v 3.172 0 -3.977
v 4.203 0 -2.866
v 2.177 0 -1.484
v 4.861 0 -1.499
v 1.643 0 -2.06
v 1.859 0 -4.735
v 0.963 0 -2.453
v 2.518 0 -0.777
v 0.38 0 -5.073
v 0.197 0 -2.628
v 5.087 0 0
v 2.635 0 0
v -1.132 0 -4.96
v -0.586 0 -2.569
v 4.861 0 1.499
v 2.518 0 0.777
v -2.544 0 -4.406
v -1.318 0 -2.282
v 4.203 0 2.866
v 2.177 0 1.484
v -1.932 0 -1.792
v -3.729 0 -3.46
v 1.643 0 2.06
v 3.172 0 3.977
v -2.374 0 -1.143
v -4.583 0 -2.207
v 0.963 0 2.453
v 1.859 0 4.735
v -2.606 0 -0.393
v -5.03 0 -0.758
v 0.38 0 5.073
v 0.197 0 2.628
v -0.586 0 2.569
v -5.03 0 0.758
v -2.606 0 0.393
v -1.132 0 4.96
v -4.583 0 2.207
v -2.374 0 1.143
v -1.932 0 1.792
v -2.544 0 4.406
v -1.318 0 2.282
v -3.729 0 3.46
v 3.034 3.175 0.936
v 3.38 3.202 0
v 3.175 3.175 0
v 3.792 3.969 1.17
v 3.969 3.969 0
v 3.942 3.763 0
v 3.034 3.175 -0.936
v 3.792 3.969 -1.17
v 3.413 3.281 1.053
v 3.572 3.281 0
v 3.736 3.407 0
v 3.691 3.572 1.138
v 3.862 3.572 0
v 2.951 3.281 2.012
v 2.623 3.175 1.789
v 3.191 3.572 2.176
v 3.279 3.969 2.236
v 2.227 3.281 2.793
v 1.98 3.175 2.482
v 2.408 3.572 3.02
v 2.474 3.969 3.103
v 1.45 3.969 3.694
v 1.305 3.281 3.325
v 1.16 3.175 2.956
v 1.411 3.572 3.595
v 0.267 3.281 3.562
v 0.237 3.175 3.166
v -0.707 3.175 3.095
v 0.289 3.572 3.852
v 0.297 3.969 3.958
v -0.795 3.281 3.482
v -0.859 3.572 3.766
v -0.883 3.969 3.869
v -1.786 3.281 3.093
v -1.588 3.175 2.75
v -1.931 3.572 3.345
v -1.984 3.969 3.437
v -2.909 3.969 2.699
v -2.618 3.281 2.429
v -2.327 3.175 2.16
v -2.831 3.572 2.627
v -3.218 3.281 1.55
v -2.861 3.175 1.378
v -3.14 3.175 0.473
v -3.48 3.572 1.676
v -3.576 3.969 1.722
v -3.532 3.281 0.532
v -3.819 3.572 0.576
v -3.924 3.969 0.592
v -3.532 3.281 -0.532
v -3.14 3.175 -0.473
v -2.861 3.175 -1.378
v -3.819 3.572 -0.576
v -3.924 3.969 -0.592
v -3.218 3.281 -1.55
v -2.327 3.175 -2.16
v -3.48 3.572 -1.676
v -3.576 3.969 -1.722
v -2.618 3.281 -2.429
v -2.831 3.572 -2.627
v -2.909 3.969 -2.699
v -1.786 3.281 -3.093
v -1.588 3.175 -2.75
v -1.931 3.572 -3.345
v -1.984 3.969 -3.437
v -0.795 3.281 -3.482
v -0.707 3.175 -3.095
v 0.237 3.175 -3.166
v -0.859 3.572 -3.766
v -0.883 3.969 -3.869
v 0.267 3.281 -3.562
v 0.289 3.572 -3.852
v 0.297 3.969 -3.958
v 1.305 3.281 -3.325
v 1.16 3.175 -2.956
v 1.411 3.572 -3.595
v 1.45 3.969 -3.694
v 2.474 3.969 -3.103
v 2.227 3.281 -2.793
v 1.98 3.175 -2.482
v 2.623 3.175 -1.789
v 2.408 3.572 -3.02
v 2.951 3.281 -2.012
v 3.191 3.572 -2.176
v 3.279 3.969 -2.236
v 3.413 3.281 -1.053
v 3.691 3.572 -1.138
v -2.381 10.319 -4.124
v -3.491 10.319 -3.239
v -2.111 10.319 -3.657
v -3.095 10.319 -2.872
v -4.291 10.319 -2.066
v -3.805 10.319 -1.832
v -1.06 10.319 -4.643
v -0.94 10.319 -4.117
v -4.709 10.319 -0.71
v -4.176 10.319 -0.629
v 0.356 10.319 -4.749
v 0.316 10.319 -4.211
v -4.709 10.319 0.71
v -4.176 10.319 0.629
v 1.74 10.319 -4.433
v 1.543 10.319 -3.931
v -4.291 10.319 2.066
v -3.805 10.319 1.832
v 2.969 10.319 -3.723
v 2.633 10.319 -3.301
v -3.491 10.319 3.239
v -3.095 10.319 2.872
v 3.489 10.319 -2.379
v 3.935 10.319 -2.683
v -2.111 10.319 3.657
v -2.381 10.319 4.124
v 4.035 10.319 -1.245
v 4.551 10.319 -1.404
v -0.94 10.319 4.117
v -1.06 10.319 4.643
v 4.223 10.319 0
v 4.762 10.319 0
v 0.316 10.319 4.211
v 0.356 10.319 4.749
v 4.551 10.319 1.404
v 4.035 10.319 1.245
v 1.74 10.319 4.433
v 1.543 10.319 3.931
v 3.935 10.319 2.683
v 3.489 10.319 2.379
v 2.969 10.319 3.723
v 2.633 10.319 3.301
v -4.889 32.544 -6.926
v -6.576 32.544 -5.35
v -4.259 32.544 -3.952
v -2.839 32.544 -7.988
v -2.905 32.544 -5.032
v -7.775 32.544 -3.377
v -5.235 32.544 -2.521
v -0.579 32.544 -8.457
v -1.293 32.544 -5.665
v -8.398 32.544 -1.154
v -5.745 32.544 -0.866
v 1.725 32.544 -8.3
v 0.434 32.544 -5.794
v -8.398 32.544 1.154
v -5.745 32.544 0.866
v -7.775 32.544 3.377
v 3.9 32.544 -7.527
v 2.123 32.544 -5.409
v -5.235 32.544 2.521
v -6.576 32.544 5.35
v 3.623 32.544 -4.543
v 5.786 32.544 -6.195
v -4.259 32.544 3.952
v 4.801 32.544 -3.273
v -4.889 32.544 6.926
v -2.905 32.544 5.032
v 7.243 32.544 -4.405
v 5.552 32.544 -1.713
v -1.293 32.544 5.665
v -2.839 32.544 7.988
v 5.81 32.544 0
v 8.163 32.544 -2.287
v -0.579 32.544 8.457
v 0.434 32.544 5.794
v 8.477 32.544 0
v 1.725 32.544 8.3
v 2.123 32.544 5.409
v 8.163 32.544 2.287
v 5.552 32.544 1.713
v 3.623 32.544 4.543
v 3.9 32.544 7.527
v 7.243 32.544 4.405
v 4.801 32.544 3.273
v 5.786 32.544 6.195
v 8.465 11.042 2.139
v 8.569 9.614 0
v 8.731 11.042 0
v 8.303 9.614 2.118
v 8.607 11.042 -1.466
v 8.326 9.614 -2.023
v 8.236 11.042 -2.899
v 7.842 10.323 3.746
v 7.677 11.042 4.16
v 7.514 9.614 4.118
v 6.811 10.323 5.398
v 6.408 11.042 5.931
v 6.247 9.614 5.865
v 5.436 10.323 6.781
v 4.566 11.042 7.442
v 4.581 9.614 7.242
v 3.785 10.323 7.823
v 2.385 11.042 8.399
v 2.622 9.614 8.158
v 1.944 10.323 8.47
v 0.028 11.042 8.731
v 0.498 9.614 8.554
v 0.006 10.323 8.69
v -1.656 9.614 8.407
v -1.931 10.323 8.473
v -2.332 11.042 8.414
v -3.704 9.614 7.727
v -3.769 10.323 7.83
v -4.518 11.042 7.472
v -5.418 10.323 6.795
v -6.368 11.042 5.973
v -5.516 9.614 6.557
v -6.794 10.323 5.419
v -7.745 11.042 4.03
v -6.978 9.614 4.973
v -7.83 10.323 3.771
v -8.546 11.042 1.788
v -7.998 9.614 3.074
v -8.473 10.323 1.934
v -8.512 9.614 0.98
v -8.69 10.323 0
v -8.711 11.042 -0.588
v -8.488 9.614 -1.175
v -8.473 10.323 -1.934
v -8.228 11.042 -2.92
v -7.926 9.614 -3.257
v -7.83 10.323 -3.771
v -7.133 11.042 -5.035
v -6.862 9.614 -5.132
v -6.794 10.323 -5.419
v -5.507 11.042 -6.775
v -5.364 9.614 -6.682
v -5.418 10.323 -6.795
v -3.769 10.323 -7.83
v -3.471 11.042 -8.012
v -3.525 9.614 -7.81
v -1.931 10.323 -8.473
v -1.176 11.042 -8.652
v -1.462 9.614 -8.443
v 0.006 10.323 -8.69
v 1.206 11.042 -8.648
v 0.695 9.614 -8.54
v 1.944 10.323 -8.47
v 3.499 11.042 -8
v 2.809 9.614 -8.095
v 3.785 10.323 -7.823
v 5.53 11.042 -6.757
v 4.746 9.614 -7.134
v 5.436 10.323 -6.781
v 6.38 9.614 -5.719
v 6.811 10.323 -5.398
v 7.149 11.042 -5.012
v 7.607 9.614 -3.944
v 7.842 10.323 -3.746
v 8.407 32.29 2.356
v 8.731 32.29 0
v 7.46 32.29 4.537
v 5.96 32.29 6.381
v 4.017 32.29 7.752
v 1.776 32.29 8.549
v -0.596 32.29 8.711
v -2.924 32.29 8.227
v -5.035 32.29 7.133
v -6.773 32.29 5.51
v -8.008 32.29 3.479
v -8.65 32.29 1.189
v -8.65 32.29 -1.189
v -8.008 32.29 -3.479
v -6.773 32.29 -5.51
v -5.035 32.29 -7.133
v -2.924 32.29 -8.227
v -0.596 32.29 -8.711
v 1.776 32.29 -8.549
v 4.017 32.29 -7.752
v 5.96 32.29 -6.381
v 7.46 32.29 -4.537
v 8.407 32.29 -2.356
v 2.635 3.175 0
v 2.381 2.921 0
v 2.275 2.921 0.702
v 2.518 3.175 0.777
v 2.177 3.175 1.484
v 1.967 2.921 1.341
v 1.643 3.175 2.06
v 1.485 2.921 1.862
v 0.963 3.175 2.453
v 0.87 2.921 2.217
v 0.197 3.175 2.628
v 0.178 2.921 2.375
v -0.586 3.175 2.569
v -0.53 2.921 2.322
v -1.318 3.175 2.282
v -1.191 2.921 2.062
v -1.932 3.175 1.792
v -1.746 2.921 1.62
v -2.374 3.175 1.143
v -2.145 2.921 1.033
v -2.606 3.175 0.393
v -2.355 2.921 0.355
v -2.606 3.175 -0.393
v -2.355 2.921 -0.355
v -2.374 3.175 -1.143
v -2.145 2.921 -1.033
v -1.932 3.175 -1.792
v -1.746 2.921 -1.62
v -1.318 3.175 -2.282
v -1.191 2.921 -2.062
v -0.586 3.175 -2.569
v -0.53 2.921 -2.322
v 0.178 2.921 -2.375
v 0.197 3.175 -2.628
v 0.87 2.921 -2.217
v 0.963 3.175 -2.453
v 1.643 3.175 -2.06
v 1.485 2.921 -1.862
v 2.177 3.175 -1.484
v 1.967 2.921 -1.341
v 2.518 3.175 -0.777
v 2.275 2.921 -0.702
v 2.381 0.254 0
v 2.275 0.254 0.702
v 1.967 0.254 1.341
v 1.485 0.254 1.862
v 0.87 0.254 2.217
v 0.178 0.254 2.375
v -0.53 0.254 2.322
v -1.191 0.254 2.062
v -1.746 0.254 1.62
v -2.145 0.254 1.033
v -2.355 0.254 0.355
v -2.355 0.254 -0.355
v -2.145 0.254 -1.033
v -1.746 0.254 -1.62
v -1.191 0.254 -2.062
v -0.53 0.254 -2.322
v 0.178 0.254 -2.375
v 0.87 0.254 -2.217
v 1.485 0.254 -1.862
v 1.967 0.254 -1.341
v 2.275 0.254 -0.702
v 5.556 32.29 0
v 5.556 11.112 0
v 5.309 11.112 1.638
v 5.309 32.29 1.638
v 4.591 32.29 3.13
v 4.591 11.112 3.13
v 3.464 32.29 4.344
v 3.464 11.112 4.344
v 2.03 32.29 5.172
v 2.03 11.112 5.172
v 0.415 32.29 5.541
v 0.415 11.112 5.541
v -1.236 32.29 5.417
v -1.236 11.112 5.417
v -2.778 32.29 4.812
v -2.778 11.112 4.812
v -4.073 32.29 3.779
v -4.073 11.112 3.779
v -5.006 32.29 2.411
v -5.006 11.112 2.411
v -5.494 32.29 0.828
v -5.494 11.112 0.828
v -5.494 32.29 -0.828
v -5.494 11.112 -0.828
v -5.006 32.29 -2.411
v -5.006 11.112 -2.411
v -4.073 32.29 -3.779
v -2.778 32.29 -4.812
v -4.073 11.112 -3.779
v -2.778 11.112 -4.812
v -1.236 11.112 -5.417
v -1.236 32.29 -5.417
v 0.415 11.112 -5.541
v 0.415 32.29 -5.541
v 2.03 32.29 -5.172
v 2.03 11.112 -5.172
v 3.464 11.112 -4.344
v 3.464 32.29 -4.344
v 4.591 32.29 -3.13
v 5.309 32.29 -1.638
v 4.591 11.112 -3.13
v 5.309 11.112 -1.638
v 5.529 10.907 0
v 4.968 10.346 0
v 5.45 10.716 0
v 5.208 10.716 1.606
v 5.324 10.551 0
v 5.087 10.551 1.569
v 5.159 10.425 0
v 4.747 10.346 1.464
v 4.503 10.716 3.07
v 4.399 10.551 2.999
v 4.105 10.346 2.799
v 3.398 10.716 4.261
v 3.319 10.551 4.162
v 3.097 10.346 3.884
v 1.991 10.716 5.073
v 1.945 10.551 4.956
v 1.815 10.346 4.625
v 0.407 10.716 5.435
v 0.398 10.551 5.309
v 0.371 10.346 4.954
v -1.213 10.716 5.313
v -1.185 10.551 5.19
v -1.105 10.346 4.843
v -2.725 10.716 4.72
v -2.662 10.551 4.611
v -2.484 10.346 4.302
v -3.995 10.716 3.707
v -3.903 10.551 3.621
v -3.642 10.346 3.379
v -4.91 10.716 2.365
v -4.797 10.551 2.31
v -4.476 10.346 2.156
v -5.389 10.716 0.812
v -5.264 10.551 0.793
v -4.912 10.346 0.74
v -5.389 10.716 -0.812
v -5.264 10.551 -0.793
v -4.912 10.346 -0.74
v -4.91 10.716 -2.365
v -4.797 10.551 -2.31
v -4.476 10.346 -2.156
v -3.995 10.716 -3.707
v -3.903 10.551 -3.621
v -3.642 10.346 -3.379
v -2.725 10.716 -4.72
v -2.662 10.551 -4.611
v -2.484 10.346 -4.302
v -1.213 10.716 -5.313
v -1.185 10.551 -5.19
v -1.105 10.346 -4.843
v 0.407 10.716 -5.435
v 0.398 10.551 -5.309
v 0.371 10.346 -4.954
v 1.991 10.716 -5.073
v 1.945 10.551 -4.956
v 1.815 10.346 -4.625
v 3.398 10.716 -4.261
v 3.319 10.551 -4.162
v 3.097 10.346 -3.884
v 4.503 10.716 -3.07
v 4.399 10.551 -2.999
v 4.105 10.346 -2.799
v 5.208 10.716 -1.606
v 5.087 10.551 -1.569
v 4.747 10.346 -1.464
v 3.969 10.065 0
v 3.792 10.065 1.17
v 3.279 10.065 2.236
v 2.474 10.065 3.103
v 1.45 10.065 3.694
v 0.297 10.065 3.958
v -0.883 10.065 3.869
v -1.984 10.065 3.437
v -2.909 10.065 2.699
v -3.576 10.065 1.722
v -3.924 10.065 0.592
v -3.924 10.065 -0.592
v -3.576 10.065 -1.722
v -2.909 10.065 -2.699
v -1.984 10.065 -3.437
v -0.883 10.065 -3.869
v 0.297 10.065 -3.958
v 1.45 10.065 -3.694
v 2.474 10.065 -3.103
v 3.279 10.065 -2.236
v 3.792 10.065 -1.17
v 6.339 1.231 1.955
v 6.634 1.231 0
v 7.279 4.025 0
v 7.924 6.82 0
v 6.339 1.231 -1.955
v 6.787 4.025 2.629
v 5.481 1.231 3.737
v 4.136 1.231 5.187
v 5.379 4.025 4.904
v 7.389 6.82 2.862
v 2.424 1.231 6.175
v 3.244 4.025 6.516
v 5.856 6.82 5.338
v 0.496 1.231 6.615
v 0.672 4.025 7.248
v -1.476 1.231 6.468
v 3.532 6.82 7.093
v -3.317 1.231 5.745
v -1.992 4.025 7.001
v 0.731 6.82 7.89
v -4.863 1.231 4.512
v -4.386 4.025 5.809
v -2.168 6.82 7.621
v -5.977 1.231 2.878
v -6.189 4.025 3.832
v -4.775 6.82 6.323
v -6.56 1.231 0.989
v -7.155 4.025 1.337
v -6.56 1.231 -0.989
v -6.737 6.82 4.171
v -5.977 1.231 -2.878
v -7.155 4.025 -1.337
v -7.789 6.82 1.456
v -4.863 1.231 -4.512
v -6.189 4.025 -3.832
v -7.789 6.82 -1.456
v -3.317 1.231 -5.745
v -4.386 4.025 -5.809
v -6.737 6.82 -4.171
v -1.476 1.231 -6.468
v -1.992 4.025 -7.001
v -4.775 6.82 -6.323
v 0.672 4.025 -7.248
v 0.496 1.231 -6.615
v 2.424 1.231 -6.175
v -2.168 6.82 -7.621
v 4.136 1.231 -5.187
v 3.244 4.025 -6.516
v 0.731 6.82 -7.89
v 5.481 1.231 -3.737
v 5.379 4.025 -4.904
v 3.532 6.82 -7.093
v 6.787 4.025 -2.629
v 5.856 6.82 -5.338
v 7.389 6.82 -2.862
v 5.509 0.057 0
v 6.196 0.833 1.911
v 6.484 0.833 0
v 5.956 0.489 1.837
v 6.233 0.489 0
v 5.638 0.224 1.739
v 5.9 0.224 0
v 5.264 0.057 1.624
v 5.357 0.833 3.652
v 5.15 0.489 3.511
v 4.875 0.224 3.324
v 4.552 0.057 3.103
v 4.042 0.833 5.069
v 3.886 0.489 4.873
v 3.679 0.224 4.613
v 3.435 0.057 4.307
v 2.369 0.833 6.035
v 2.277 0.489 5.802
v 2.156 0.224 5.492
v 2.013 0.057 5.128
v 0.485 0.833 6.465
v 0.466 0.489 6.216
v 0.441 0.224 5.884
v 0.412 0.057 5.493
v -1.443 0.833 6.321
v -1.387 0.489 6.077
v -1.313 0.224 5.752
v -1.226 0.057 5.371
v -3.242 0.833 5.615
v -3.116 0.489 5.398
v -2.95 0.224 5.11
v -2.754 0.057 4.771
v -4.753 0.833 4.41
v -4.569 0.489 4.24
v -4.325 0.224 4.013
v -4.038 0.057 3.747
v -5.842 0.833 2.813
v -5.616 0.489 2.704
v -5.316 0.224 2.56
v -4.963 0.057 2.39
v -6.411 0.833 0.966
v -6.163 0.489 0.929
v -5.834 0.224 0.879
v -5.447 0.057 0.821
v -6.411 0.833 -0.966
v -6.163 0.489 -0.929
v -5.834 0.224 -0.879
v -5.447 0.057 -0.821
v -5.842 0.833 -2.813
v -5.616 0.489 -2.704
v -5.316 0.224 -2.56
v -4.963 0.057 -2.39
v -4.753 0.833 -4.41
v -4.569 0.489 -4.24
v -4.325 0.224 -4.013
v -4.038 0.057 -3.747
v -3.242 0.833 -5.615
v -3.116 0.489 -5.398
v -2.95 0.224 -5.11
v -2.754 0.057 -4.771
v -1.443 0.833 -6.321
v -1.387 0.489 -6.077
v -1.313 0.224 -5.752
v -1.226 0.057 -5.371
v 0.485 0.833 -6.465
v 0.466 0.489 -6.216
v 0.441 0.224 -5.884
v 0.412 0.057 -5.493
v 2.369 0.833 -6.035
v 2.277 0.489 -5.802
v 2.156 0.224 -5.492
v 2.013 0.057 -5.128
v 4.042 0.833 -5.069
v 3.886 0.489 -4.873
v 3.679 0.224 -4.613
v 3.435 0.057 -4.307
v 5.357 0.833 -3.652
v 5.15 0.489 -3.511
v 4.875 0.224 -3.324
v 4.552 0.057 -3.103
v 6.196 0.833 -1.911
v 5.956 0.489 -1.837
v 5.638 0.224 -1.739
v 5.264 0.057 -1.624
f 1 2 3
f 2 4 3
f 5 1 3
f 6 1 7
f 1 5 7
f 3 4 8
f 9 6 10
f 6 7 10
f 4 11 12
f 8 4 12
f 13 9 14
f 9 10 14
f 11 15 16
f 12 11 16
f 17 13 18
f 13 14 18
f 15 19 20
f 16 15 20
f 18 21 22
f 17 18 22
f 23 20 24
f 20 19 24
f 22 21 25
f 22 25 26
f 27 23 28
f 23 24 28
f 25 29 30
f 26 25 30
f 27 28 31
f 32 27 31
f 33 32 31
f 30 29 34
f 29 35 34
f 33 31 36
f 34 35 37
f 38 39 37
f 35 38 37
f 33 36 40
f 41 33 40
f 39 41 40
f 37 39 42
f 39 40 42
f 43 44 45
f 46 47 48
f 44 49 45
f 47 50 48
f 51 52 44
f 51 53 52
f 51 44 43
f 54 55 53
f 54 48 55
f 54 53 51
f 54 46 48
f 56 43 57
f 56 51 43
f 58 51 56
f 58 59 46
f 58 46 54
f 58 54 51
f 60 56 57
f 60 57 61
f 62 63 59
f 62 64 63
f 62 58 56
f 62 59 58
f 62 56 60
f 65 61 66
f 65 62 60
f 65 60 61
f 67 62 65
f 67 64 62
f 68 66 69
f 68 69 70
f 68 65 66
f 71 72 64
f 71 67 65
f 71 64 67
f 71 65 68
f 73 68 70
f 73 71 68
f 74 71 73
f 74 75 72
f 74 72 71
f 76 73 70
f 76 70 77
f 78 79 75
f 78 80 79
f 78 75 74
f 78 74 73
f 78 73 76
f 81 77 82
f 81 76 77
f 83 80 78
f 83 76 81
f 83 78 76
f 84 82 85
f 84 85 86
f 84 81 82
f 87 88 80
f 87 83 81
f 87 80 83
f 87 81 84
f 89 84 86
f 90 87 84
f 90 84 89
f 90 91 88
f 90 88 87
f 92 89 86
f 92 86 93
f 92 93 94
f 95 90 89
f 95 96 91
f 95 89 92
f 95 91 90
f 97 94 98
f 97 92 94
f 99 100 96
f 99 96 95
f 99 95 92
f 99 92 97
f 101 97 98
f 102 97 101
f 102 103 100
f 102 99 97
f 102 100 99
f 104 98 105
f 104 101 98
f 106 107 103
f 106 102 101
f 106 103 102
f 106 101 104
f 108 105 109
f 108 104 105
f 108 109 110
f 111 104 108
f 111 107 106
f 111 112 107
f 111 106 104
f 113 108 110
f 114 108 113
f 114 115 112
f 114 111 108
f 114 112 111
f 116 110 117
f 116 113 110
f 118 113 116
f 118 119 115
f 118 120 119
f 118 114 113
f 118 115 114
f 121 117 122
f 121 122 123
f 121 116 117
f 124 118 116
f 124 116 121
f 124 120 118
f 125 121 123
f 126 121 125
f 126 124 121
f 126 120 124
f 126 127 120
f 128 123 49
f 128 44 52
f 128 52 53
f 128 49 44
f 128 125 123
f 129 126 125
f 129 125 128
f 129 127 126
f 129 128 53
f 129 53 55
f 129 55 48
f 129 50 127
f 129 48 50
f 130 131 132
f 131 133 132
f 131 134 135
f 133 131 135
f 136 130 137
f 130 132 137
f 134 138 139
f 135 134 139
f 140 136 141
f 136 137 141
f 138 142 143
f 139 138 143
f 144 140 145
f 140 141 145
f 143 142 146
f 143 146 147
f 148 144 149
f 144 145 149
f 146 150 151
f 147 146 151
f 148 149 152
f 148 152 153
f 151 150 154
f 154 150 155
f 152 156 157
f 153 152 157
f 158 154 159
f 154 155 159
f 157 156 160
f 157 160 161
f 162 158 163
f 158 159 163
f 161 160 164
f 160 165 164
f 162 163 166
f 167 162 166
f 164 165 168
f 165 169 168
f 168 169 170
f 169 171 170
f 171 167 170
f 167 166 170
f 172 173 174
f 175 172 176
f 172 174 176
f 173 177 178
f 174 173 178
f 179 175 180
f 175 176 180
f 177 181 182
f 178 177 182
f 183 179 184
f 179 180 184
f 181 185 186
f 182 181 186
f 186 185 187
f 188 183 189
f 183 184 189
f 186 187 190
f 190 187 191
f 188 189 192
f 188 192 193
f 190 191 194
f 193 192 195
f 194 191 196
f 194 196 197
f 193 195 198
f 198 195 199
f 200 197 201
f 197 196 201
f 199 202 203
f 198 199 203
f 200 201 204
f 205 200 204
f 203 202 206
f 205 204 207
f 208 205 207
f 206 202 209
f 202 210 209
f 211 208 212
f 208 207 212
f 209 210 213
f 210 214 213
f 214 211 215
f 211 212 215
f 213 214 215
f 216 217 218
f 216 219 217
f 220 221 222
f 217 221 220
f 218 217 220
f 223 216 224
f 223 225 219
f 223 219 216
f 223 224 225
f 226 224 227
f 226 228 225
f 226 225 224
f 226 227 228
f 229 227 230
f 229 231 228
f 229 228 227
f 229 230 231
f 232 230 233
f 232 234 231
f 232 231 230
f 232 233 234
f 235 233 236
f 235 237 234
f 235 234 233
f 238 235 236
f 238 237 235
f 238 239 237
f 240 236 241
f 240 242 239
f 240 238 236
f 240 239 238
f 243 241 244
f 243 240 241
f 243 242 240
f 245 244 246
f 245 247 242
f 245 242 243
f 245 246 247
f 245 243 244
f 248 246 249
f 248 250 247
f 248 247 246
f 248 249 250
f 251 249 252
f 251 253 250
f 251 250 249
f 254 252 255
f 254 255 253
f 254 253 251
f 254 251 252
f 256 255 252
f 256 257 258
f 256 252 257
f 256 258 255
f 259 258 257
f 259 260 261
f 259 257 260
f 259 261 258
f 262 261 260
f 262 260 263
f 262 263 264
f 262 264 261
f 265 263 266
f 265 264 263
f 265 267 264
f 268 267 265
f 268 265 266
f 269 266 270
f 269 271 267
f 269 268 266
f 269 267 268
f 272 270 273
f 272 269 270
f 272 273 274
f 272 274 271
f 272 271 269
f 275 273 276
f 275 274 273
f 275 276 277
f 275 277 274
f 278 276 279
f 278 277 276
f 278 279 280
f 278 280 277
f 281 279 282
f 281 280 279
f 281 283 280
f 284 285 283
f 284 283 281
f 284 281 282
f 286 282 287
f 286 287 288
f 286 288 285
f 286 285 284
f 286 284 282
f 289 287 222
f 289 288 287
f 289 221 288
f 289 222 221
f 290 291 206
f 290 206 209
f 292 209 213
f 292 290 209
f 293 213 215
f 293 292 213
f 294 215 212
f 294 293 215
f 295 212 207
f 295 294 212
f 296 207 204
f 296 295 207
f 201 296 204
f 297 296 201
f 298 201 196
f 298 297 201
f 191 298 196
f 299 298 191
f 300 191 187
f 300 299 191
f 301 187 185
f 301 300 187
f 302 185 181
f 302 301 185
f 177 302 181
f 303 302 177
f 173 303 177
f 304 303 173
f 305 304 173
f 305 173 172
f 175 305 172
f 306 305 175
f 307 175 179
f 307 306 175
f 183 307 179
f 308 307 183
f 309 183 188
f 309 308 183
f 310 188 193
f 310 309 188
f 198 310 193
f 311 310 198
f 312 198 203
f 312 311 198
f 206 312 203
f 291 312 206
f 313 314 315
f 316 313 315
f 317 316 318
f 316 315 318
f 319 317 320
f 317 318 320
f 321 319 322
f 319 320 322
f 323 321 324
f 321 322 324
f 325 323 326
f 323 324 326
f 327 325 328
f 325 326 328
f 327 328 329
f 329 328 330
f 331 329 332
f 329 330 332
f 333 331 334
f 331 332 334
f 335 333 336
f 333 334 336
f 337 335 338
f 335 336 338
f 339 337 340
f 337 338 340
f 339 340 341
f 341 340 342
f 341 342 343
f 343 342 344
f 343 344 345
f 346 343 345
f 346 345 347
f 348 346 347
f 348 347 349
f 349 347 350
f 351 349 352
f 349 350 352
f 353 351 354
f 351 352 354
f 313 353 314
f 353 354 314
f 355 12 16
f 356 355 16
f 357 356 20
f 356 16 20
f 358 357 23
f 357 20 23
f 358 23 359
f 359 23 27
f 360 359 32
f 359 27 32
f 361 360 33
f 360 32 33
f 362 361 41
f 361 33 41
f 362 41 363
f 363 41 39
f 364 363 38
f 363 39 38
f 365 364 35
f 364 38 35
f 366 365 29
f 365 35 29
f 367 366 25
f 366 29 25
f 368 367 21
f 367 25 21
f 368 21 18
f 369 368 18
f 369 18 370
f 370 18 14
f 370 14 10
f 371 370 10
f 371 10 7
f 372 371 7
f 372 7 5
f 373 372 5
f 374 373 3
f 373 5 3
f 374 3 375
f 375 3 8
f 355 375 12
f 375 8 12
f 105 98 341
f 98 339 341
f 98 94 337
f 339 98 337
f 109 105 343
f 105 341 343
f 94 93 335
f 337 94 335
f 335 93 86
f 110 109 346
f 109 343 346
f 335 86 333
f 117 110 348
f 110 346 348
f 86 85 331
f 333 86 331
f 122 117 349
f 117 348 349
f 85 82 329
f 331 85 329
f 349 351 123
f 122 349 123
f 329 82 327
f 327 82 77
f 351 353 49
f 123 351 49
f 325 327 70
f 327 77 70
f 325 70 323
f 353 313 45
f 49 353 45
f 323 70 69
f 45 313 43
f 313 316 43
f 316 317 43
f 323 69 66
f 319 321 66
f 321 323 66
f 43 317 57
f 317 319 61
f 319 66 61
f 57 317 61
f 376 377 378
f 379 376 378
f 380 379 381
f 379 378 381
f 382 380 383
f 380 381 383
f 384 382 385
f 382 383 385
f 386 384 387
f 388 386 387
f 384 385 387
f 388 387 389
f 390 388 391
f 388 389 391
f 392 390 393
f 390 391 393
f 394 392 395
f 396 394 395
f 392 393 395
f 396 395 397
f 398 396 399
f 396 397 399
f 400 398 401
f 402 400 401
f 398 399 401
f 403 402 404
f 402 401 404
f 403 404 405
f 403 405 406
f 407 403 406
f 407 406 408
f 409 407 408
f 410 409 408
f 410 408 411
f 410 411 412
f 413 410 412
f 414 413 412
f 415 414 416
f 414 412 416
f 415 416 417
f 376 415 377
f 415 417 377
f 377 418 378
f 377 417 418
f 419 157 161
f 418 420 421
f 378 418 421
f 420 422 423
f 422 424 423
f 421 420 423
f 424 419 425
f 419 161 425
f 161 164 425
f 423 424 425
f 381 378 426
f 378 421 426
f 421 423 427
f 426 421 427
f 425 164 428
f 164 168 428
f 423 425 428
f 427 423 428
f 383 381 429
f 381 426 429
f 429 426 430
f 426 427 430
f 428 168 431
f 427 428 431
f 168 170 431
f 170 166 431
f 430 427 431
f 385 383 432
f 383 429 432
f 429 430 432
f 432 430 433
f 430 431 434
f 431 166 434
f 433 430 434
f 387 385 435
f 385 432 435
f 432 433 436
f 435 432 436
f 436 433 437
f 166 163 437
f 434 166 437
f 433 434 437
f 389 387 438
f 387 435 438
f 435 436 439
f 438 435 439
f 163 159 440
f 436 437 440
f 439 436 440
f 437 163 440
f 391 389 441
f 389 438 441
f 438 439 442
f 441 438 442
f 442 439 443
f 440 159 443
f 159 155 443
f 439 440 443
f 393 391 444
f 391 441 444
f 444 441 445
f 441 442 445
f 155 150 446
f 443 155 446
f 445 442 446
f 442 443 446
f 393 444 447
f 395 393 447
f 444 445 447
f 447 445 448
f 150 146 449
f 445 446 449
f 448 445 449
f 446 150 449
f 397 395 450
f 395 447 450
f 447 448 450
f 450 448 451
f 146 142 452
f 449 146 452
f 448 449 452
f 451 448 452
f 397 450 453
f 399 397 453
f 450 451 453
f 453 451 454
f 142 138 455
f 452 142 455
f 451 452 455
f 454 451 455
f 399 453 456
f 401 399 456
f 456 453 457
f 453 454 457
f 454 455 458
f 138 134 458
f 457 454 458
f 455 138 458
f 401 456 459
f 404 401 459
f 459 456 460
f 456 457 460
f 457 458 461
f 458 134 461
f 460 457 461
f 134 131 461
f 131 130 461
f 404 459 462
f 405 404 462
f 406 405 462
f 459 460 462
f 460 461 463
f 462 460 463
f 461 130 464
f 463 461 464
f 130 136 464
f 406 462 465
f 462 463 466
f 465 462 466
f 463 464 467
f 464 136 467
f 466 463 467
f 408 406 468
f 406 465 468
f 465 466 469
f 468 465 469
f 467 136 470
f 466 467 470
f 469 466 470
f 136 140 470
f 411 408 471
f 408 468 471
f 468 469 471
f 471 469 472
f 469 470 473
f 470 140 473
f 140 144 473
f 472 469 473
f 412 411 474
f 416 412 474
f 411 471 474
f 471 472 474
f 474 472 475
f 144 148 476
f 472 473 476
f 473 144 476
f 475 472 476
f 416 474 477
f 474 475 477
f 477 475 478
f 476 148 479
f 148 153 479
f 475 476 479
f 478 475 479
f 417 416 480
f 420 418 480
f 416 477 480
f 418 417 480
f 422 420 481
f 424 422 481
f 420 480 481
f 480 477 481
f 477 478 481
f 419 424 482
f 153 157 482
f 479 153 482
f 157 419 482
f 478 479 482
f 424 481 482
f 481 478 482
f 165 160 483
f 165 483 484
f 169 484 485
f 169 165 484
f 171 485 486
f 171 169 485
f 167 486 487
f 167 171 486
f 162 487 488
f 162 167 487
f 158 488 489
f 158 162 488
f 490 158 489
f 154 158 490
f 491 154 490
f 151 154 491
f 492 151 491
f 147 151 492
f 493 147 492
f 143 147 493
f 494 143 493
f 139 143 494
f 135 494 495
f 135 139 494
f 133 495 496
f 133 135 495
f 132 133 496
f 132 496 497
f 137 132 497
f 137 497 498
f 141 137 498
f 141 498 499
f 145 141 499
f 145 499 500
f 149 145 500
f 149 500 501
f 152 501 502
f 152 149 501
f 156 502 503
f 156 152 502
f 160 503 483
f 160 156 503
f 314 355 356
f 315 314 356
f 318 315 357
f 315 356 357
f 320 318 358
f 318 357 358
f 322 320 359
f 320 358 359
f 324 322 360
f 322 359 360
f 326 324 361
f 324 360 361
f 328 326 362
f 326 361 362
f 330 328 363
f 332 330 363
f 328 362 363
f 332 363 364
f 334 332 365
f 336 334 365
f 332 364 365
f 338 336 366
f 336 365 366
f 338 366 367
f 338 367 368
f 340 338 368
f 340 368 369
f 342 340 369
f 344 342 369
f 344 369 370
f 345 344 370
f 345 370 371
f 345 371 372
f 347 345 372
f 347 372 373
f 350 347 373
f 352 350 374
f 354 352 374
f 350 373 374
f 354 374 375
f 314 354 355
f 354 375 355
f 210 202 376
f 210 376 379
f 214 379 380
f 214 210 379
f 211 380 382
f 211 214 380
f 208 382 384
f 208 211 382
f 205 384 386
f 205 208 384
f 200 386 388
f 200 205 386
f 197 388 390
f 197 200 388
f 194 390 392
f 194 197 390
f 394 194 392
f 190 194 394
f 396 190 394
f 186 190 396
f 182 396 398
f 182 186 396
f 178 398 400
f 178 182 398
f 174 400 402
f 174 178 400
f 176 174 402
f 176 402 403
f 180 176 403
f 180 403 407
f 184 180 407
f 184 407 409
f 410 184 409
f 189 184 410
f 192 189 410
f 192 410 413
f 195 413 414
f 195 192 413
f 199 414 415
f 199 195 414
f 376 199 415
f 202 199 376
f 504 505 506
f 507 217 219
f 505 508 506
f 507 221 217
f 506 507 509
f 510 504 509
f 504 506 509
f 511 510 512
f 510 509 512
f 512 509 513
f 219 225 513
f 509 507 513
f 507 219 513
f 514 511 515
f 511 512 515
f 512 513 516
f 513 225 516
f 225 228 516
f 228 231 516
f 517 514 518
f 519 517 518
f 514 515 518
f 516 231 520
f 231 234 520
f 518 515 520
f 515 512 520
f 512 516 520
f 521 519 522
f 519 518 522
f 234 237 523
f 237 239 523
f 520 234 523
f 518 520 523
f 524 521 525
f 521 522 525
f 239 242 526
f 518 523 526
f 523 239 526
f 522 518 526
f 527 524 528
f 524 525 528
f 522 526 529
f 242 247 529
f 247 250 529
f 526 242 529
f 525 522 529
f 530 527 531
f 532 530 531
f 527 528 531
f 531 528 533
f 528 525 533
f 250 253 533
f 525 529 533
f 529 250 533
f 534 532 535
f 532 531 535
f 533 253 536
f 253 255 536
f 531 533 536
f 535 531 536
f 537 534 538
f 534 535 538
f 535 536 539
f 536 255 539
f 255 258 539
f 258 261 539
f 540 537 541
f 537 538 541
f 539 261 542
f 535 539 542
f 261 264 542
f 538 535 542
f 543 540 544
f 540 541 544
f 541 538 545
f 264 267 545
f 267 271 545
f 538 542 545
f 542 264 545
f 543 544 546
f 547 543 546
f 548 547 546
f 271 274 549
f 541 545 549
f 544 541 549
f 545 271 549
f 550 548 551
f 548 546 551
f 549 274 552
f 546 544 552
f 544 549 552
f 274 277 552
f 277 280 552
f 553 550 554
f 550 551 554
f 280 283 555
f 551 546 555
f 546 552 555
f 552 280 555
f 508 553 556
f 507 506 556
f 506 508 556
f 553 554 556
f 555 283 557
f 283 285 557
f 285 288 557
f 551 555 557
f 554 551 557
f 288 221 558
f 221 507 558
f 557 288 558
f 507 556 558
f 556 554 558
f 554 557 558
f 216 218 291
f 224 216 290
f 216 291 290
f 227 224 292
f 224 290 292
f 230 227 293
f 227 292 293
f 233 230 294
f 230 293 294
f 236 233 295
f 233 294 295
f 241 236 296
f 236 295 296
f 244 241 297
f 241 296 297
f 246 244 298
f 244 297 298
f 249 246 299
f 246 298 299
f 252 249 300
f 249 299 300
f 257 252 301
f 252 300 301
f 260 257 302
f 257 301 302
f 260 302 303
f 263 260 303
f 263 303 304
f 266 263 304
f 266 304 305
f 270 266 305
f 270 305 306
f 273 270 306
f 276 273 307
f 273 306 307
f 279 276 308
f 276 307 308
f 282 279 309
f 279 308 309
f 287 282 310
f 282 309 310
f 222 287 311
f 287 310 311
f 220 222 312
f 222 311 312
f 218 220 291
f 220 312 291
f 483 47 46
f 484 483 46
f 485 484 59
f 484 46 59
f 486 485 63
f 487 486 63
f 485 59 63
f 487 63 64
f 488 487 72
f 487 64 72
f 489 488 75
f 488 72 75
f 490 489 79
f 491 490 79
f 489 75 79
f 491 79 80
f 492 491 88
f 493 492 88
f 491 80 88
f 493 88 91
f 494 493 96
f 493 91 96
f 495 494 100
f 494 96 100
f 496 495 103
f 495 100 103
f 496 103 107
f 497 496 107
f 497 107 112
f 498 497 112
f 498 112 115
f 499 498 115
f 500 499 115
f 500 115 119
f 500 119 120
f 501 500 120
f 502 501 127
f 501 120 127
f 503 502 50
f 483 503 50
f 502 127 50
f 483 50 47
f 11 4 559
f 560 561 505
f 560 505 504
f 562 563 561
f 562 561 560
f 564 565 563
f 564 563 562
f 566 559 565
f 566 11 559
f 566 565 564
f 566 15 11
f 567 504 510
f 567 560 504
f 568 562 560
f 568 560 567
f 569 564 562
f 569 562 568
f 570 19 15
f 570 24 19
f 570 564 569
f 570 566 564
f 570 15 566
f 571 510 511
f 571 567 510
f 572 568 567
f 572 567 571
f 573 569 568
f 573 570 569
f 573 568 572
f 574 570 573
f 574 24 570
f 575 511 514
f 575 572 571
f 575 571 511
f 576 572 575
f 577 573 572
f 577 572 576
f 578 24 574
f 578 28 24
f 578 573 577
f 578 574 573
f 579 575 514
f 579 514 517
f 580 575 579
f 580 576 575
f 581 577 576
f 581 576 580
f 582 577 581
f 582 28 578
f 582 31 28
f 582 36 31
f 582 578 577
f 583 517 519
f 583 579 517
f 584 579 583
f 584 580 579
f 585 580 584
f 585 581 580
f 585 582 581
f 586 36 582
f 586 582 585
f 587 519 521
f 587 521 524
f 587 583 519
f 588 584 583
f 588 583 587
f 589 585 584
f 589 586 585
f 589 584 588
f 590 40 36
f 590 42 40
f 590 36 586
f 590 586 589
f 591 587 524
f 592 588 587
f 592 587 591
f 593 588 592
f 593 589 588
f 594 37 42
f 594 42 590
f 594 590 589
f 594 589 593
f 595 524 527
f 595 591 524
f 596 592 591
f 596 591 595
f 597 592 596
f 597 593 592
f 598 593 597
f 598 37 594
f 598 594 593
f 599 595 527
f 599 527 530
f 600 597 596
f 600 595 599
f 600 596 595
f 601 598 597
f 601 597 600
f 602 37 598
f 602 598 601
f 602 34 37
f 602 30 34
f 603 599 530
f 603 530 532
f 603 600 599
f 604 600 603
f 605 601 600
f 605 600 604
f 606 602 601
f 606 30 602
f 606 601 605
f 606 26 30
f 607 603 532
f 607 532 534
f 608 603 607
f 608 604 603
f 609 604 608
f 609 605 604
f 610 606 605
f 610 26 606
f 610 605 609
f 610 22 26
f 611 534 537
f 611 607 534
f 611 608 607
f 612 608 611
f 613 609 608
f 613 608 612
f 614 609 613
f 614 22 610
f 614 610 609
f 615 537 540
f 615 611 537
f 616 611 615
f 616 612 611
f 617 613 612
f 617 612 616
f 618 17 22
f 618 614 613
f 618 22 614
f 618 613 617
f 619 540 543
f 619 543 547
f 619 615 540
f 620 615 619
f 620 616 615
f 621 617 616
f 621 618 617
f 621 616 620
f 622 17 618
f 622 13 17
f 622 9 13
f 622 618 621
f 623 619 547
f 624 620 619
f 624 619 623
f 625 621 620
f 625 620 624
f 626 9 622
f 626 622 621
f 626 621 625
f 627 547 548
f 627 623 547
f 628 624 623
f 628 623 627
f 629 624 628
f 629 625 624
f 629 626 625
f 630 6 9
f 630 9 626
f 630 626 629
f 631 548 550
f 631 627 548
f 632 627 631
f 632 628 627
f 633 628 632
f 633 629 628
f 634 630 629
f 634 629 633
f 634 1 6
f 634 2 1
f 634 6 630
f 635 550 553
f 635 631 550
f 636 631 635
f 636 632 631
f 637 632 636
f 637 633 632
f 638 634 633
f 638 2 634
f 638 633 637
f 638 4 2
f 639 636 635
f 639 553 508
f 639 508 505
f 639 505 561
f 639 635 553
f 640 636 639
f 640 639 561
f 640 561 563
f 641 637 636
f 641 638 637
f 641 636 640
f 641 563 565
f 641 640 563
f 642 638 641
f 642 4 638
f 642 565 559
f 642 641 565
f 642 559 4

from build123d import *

# Parameters (mm, degrees)
FILLET2_R     = 6.35
FILLET3_R     = 1.5875
FILLET1_R     = 0.79375
CHAMFER1_SIZE = 0.254


with BuildPart() as part:
    # Sketch1 → Revolve1 (revolve)
    with BuildSketch(Plane.XY):
        Polygon((8.73125, 32.54375), (5.55625, 32.54375), (5.55625, 10.31875), (3.96875, 10.31875), (3.96875, 3.175), (2.38125, 3.175), (2.38125, 0), (6.35, 0), (8.73125, 10.31875), align=None)
    revolve(axis=Axis((0, 4.297998533, 0), (0, -1, 0)))

    # Fillet2
    fillet2_edges = [part.edges().sort_by_distance(p)[0] for p in [
        (-8.73125, 10.31875, 0),
    ]]
    fillet(fillet2_edges, radius=FILLET2_R)

    # Fillet3
    fillet3_edges = [part.edges().sort_by_distance(p)[0] for p in [
        (-6.35, 0, 0),
    ]]
    fillet(fillet3_edges, radius=FILLET3_R)

    # Fillet1
    fillet1_edges = [part.edges().sort_by_distance(p)[0] for p in [
        (-5.55625, 10.31875, 0),
        (-3.96875, 3.175, 0),
    ]]
    fillet(fillet1_edges, radius=FILLET1_R)

    # Chamfer1
    chamfer1_edges = [part.edges().sort_by_distance(p)[0] for p in [
        (-2.38125, 0, 0),
        (-8.73125, 32.54375, 0),
        (-5.55625, 32.54375, 0),
        (-3.96875, 10.31875, 0),
        (-2.38125, 3.175, 0),
    ]]
    chamfer(chamfer1_edges, length=CHAMFER1_SIZE)


solid = part.part
